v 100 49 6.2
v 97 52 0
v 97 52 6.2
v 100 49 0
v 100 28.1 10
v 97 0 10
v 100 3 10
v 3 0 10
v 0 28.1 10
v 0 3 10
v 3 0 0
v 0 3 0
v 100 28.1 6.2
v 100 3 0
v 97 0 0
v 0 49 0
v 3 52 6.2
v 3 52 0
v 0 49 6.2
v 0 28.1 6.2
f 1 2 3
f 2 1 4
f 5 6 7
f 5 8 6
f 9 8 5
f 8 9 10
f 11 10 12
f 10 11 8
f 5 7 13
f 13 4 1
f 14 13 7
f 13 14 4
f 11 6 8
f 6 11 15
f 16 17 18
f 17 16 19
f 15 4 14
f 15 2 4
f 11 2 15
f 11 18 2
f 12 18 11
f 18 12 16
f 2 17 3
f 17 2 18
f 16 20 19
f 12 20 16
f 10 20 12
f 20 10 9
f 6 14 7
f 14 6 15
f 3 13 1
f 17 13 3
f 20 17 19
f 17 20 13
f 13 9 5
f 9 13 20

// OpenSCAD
$fn = 32;

// ----------------------------------------------------------------------
// Stepped bar: sidestep, 100 x 52 x 10/6.2 mm
// ----------------------------------------------------------------------

// --- parameters (mm) ---
bar_l = 100;              // bar length, X
bar_w = 52;               // bar width, Y
plate_t = 10;             // thickness of the thick zone, Z
thin_t = 6.2;             // thickness of the thin zone
corner_c = 3;             // corner chamfer of the bar
step_cut = 3.8;           // material removed from the thin zone
ledge_y = 28.1;           // start of the ledge from the front edge
depth_1 = 3.8;            // depth of cut 1 from the top face

profile = [[3, 0], [97, 0], [100, 3], [100, 49], [97, 52], [3, 52], [0, 49], [0, 3]];  // primary outline, 8 points, counter clockwise
void_1 = [[-1, 28.1], [101, 28.1], [101, 53], [-1, 53]];  // ledge cut along one edge, 4 points

// --- the one profile operation ---
difference() {
  linear_extrude(height = plate_t) polygon(points = profile);
  translate([0, 0, plate_t - depth_1])
    linear_extrude(height = depth_1 + 1) polygon(points = void_1);
}
